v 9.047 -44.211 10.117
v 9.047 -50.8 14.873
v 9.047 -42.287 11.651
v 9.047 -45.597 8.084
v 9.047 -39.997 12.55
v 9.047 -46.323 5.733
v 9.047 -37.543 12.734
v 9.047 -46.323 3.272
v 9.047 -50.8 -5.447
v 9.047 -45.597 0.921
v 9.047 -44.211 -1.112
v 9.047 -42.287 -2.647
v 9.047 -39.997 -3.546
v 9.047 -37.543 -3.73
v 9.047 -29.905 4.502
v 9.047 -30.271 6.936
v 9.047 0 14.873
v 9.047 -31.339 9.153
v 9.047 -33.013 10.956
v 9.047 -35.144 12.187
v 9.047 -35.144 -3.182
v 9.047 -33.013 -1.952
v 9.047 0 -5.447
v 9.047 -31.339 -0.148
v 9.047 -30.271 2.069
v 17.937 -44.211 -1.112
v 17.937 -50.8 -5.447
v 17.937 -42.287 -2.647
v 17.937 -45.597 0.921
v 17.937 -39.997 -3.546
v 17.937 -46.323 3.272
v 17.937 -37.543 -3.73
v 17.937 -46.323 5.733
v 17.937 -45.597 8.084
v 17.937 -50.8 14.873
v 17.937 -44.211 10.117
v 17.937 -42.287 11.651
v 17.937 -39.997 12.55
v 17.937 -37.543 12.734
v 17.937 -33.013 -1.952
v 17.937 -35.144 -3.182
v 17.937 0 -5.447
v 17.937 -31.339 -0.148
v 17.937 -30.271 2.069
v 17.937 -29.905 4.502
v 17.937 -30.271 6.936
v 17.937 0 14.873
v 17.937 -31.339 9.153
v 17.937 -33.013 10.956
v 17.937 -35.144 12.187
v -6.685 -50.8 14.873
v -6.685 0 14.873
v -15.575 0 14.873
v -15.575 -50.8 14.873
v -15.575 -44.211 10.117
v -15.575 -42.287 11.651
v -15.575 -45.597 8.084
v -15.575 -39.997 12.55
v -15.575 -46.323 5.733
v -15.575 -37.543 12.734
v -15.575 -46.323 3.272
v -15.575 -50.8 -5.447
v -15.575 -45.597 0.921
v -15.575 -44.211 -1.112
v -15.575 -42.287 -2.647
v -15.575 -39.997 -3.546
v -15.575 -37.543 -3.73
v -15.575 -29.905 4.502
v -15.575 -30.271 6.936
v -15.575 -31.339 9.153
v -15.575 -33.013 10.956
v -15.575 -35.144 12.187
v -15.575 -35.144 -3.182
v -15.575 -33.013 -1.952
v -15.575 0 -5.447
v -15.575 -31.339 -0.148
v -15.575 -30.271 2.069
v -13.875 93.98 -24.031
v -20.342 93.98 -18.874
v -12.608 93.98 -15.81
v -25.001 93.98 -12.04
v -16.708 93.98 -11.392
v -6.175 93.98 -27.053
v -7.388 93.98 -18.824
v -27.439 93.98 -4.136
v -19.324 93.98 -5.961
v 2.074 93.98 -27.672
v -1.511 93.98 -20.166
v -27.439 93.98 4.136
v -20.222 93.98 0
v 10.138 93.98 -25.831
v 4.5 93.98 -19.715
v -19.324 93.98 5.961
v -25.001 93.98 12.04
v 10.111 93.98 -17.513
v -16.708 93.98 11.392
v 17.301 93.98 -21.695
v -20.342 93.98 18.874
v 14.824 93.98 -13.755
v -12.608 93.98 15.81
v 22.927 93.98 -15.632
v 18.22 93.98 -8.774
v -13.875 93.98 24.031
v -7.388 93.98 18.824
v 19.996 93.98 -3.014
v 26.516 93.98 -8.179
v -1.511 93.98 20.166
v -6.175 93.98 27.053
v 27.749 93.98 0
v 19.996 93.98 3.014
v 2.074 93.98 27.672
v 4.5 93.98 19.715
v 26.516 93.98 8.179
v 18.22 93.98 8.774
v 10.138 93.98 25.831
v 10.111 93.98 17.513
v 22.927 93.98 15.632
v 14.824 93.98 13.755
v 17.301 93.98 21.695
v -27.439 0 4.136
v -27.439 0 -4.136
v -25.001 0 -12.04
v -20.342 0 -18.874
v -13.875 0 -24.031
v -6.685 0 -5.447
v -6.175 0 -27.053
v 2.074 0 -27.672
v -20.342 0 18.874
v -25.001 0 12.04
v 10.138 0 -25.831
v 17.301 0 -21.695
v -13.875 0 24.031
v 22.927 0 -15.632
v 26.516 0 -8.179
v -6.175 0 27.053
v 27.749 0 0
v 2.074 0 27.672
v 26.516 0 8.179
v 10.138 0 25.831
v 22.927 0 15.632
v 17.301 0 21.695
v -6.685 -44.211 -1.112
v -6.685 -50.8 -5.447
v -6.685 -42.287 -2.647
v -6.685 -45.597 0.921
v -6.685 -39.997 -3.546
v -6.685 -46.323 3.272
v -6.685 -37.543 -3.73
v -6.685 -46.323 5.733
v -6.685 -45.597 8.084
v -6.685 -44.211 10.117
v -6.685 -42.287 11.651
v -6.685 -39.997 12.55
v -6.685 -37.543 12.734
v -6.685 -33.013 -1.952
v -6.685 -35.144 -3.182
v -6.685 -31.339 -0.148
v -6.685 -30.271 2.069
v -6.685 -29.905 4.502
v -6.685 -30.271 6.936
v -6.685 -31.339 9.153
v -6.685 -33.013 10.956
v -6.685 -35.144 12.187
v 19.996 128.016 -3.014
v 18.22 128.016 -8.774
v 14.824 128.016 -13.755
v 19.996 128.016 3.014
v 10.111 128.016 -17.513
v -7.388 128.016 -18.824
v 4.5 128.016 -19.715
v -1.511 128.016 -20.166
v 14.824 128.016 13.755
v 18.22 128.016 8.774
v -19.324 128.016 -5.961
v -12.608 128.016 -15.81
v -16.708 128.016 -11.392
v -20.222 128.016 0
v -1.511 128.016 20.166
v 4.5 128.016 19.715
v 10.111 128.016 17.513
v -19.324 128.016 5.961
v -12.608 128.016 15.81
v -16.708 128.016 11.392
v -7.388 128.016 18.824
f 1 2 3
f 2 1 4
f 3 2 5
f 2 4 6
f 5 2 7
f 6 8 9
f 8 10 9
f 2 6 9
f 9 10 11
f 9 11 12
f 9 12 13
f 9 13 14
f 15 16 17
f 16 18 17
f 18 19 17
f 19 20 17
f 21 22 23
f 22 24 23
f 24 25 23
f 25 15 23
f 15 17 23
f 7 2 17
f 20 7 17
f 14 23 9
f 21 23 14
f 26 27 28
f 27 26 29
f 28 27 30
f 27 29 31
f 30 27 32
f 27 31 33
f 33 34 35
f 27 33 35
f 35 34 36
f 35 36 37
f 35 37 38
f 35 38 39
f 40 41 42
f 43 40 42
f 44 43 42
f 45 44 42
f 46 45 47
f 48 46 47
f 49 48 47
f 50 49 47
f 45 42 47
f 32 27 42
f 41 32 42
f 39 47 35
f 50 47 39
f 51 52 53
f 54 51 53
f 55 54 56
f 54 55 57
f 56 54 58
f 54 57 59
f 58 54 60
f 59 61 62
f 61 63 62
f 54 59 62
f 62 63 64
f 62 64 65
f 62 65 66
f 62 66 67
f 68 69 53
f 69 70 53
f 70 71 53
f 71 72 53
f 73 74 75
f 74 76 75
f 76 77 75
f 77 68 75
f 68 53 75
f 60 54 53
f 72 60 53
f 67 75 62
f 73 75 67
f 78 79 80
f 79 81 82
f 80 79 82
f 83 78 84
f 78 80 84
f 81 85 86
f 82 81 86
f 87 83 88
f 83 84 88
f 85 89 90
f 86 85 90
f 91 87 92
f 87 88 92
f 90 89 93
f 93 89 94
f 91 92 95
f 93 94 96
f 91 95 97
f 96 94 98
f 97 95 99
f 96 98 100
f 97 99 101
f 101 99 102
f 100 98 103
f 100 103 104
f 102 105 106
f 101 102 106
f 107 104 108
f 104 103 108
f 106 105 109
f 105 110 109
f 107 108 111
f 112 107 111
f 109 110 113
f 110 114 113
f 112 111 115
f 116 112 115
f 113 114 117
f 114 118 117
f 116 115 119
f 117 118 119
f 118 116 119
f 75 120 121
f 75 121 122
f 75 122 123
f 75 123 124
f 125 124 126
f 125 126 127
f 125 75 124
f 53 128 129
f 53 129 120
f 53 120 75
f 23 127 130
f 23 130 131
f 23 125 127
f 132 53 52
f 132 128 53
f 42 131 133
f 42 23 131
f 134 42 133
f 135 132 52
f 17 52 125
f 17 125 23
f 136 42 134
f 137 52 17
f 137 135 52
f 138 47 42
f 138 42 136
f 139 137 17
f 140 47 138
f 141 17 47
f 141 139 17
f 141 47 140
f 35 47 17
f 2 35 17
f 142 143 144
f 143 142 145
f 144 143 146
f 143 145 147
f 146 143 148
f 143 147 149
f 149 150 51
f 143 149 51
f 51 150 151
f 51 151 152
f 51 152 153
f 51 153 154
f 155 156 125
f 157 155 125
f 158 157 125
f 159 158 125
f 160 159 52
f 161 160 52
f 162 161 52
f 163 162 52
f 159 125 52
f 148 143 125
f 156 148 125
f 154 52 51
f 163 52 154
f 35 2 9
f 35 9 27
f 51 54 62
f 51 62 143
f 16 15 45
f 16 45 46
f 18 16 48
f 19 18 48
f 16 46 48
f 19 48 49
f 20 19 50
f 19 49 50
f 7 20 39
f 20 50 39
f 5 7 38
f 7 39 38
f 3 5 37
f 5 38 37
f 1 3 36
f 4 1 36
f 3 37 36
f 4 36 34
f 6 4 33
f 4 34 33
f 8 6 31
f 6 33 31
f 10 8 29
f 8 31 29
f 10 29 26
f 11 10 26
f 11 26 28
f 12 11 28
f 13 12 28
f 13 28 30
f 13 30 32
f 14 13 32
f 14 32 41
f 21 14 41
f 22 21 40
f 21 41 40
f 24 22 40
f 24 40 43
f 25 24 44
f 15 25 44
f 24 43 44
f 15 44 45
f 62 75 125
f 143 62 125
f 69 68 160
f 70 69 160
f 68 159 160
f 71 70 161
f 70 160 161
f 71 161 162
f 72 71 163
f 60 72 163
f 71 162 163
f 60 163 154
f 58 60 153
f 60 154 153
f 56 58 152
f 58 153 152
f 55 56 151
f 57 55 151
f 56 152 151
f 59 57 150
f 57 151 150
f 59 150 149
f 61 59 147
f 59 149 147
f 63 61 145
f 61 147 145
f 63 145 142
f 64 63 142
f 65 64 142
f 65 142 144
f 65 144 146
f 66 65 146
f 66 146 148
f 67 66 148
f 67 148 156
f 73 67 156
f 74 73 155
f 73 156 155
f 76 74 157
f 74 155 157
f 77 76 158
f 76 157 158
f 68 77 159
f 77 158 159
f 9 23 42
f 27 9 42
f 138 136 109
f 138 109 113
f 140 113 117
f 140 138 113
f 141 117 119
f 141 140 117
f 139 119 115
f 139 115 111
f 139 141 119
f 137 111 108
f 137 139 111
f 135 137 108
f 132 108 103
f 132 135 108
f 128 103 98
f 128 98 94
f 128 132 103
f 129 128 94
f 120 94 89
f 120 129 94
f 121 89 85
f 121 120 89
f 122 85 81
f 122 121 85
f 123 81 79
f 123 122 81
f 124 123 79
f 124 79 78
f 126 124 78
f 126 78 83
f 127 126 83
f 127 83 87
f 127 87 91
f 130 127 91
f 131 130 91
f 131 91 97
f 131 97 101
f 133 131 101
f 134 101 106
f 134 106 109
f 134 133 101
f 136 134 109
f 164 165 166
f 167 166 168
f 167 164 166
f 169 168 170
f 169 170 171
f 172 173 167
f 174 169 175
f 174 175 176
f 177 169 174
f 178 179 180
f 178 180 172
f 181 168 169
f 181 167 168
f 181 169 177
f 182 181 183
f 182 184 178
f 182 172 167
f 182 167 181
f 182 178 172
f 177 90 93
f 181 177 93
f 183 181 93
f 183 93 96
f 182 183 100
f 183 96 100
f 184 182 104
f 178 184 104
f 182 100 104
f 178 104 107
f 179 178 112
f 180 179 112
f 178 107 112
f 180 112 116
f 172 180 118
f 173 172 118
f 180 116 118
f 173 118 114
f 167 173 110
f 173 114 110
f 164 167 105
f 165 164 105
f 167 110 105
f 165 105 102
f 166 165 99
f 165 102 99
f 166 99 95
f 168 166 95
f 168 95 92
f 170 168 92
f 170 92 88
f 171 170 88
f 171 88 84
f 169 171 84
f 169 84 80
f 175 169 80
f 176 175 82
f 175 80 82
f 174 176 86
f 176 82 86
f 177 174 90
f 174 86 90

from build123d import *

# Parameters (mm, degrees)
F0_R     = 27.7491203527
F1_DEPTH = 93.98
F2_R     = 20.2221650078
F3_DEPTH = 34.036
F5_DEPTH = 50.8
F6_R     = 8.255
F8_DEPTH = 38.1


# Not quite as in the source:
# - the program builds the solid bodies; features that only make, move or delete a surface that nothing else refers to are left out


with BuildPart() as f1:
    # F0 (on Front) → F1 (new body)
    with BuildSketch(Plane.XZ):
        Circle(F0_R)
    extrude(amount=-F1_DEPTH)

    # F2 (on face) → F3 (join)
    with BuildSketch(Plane(origin=(0, 93.98, 0), x_dir=(-1, 0, 0), z_dir=(0, 1, 0))):
        Circle(F2_R)
    extrude(amount=F3_DEPTH)

    # F4 (on Front) → F5 (join)
    with BuildSketch(Plane.XZ):
        Polygon((-6.6853386185, -5.4466079127), (-6.6853386185, 0), (-6.6853386185, 14.8733920873), (-15.5753386185, 14.8733920873), (-15.5753386185, -5.4466079127), align=None)
        Polygon((9.04710629, 14.8733920873), (9.04710629, 0), (9.04710629, -5.4466079127), (17.93710629, -5.4466079127), (17.93710629, 14.8733920873), align=None)
    extrude(amount=F5_DEPTH)

    # F6 (on Right) → F8 (cut, symmetric)
    with BuildSketch(Plane.YZ):
        with Locations((-38.159750402, 4.5024077408)):
            Circle(F6_R)
    extrude(amount=F8_DEPTH, both=True, mode=Mode.SUBTRACT)


solid = f1.part
